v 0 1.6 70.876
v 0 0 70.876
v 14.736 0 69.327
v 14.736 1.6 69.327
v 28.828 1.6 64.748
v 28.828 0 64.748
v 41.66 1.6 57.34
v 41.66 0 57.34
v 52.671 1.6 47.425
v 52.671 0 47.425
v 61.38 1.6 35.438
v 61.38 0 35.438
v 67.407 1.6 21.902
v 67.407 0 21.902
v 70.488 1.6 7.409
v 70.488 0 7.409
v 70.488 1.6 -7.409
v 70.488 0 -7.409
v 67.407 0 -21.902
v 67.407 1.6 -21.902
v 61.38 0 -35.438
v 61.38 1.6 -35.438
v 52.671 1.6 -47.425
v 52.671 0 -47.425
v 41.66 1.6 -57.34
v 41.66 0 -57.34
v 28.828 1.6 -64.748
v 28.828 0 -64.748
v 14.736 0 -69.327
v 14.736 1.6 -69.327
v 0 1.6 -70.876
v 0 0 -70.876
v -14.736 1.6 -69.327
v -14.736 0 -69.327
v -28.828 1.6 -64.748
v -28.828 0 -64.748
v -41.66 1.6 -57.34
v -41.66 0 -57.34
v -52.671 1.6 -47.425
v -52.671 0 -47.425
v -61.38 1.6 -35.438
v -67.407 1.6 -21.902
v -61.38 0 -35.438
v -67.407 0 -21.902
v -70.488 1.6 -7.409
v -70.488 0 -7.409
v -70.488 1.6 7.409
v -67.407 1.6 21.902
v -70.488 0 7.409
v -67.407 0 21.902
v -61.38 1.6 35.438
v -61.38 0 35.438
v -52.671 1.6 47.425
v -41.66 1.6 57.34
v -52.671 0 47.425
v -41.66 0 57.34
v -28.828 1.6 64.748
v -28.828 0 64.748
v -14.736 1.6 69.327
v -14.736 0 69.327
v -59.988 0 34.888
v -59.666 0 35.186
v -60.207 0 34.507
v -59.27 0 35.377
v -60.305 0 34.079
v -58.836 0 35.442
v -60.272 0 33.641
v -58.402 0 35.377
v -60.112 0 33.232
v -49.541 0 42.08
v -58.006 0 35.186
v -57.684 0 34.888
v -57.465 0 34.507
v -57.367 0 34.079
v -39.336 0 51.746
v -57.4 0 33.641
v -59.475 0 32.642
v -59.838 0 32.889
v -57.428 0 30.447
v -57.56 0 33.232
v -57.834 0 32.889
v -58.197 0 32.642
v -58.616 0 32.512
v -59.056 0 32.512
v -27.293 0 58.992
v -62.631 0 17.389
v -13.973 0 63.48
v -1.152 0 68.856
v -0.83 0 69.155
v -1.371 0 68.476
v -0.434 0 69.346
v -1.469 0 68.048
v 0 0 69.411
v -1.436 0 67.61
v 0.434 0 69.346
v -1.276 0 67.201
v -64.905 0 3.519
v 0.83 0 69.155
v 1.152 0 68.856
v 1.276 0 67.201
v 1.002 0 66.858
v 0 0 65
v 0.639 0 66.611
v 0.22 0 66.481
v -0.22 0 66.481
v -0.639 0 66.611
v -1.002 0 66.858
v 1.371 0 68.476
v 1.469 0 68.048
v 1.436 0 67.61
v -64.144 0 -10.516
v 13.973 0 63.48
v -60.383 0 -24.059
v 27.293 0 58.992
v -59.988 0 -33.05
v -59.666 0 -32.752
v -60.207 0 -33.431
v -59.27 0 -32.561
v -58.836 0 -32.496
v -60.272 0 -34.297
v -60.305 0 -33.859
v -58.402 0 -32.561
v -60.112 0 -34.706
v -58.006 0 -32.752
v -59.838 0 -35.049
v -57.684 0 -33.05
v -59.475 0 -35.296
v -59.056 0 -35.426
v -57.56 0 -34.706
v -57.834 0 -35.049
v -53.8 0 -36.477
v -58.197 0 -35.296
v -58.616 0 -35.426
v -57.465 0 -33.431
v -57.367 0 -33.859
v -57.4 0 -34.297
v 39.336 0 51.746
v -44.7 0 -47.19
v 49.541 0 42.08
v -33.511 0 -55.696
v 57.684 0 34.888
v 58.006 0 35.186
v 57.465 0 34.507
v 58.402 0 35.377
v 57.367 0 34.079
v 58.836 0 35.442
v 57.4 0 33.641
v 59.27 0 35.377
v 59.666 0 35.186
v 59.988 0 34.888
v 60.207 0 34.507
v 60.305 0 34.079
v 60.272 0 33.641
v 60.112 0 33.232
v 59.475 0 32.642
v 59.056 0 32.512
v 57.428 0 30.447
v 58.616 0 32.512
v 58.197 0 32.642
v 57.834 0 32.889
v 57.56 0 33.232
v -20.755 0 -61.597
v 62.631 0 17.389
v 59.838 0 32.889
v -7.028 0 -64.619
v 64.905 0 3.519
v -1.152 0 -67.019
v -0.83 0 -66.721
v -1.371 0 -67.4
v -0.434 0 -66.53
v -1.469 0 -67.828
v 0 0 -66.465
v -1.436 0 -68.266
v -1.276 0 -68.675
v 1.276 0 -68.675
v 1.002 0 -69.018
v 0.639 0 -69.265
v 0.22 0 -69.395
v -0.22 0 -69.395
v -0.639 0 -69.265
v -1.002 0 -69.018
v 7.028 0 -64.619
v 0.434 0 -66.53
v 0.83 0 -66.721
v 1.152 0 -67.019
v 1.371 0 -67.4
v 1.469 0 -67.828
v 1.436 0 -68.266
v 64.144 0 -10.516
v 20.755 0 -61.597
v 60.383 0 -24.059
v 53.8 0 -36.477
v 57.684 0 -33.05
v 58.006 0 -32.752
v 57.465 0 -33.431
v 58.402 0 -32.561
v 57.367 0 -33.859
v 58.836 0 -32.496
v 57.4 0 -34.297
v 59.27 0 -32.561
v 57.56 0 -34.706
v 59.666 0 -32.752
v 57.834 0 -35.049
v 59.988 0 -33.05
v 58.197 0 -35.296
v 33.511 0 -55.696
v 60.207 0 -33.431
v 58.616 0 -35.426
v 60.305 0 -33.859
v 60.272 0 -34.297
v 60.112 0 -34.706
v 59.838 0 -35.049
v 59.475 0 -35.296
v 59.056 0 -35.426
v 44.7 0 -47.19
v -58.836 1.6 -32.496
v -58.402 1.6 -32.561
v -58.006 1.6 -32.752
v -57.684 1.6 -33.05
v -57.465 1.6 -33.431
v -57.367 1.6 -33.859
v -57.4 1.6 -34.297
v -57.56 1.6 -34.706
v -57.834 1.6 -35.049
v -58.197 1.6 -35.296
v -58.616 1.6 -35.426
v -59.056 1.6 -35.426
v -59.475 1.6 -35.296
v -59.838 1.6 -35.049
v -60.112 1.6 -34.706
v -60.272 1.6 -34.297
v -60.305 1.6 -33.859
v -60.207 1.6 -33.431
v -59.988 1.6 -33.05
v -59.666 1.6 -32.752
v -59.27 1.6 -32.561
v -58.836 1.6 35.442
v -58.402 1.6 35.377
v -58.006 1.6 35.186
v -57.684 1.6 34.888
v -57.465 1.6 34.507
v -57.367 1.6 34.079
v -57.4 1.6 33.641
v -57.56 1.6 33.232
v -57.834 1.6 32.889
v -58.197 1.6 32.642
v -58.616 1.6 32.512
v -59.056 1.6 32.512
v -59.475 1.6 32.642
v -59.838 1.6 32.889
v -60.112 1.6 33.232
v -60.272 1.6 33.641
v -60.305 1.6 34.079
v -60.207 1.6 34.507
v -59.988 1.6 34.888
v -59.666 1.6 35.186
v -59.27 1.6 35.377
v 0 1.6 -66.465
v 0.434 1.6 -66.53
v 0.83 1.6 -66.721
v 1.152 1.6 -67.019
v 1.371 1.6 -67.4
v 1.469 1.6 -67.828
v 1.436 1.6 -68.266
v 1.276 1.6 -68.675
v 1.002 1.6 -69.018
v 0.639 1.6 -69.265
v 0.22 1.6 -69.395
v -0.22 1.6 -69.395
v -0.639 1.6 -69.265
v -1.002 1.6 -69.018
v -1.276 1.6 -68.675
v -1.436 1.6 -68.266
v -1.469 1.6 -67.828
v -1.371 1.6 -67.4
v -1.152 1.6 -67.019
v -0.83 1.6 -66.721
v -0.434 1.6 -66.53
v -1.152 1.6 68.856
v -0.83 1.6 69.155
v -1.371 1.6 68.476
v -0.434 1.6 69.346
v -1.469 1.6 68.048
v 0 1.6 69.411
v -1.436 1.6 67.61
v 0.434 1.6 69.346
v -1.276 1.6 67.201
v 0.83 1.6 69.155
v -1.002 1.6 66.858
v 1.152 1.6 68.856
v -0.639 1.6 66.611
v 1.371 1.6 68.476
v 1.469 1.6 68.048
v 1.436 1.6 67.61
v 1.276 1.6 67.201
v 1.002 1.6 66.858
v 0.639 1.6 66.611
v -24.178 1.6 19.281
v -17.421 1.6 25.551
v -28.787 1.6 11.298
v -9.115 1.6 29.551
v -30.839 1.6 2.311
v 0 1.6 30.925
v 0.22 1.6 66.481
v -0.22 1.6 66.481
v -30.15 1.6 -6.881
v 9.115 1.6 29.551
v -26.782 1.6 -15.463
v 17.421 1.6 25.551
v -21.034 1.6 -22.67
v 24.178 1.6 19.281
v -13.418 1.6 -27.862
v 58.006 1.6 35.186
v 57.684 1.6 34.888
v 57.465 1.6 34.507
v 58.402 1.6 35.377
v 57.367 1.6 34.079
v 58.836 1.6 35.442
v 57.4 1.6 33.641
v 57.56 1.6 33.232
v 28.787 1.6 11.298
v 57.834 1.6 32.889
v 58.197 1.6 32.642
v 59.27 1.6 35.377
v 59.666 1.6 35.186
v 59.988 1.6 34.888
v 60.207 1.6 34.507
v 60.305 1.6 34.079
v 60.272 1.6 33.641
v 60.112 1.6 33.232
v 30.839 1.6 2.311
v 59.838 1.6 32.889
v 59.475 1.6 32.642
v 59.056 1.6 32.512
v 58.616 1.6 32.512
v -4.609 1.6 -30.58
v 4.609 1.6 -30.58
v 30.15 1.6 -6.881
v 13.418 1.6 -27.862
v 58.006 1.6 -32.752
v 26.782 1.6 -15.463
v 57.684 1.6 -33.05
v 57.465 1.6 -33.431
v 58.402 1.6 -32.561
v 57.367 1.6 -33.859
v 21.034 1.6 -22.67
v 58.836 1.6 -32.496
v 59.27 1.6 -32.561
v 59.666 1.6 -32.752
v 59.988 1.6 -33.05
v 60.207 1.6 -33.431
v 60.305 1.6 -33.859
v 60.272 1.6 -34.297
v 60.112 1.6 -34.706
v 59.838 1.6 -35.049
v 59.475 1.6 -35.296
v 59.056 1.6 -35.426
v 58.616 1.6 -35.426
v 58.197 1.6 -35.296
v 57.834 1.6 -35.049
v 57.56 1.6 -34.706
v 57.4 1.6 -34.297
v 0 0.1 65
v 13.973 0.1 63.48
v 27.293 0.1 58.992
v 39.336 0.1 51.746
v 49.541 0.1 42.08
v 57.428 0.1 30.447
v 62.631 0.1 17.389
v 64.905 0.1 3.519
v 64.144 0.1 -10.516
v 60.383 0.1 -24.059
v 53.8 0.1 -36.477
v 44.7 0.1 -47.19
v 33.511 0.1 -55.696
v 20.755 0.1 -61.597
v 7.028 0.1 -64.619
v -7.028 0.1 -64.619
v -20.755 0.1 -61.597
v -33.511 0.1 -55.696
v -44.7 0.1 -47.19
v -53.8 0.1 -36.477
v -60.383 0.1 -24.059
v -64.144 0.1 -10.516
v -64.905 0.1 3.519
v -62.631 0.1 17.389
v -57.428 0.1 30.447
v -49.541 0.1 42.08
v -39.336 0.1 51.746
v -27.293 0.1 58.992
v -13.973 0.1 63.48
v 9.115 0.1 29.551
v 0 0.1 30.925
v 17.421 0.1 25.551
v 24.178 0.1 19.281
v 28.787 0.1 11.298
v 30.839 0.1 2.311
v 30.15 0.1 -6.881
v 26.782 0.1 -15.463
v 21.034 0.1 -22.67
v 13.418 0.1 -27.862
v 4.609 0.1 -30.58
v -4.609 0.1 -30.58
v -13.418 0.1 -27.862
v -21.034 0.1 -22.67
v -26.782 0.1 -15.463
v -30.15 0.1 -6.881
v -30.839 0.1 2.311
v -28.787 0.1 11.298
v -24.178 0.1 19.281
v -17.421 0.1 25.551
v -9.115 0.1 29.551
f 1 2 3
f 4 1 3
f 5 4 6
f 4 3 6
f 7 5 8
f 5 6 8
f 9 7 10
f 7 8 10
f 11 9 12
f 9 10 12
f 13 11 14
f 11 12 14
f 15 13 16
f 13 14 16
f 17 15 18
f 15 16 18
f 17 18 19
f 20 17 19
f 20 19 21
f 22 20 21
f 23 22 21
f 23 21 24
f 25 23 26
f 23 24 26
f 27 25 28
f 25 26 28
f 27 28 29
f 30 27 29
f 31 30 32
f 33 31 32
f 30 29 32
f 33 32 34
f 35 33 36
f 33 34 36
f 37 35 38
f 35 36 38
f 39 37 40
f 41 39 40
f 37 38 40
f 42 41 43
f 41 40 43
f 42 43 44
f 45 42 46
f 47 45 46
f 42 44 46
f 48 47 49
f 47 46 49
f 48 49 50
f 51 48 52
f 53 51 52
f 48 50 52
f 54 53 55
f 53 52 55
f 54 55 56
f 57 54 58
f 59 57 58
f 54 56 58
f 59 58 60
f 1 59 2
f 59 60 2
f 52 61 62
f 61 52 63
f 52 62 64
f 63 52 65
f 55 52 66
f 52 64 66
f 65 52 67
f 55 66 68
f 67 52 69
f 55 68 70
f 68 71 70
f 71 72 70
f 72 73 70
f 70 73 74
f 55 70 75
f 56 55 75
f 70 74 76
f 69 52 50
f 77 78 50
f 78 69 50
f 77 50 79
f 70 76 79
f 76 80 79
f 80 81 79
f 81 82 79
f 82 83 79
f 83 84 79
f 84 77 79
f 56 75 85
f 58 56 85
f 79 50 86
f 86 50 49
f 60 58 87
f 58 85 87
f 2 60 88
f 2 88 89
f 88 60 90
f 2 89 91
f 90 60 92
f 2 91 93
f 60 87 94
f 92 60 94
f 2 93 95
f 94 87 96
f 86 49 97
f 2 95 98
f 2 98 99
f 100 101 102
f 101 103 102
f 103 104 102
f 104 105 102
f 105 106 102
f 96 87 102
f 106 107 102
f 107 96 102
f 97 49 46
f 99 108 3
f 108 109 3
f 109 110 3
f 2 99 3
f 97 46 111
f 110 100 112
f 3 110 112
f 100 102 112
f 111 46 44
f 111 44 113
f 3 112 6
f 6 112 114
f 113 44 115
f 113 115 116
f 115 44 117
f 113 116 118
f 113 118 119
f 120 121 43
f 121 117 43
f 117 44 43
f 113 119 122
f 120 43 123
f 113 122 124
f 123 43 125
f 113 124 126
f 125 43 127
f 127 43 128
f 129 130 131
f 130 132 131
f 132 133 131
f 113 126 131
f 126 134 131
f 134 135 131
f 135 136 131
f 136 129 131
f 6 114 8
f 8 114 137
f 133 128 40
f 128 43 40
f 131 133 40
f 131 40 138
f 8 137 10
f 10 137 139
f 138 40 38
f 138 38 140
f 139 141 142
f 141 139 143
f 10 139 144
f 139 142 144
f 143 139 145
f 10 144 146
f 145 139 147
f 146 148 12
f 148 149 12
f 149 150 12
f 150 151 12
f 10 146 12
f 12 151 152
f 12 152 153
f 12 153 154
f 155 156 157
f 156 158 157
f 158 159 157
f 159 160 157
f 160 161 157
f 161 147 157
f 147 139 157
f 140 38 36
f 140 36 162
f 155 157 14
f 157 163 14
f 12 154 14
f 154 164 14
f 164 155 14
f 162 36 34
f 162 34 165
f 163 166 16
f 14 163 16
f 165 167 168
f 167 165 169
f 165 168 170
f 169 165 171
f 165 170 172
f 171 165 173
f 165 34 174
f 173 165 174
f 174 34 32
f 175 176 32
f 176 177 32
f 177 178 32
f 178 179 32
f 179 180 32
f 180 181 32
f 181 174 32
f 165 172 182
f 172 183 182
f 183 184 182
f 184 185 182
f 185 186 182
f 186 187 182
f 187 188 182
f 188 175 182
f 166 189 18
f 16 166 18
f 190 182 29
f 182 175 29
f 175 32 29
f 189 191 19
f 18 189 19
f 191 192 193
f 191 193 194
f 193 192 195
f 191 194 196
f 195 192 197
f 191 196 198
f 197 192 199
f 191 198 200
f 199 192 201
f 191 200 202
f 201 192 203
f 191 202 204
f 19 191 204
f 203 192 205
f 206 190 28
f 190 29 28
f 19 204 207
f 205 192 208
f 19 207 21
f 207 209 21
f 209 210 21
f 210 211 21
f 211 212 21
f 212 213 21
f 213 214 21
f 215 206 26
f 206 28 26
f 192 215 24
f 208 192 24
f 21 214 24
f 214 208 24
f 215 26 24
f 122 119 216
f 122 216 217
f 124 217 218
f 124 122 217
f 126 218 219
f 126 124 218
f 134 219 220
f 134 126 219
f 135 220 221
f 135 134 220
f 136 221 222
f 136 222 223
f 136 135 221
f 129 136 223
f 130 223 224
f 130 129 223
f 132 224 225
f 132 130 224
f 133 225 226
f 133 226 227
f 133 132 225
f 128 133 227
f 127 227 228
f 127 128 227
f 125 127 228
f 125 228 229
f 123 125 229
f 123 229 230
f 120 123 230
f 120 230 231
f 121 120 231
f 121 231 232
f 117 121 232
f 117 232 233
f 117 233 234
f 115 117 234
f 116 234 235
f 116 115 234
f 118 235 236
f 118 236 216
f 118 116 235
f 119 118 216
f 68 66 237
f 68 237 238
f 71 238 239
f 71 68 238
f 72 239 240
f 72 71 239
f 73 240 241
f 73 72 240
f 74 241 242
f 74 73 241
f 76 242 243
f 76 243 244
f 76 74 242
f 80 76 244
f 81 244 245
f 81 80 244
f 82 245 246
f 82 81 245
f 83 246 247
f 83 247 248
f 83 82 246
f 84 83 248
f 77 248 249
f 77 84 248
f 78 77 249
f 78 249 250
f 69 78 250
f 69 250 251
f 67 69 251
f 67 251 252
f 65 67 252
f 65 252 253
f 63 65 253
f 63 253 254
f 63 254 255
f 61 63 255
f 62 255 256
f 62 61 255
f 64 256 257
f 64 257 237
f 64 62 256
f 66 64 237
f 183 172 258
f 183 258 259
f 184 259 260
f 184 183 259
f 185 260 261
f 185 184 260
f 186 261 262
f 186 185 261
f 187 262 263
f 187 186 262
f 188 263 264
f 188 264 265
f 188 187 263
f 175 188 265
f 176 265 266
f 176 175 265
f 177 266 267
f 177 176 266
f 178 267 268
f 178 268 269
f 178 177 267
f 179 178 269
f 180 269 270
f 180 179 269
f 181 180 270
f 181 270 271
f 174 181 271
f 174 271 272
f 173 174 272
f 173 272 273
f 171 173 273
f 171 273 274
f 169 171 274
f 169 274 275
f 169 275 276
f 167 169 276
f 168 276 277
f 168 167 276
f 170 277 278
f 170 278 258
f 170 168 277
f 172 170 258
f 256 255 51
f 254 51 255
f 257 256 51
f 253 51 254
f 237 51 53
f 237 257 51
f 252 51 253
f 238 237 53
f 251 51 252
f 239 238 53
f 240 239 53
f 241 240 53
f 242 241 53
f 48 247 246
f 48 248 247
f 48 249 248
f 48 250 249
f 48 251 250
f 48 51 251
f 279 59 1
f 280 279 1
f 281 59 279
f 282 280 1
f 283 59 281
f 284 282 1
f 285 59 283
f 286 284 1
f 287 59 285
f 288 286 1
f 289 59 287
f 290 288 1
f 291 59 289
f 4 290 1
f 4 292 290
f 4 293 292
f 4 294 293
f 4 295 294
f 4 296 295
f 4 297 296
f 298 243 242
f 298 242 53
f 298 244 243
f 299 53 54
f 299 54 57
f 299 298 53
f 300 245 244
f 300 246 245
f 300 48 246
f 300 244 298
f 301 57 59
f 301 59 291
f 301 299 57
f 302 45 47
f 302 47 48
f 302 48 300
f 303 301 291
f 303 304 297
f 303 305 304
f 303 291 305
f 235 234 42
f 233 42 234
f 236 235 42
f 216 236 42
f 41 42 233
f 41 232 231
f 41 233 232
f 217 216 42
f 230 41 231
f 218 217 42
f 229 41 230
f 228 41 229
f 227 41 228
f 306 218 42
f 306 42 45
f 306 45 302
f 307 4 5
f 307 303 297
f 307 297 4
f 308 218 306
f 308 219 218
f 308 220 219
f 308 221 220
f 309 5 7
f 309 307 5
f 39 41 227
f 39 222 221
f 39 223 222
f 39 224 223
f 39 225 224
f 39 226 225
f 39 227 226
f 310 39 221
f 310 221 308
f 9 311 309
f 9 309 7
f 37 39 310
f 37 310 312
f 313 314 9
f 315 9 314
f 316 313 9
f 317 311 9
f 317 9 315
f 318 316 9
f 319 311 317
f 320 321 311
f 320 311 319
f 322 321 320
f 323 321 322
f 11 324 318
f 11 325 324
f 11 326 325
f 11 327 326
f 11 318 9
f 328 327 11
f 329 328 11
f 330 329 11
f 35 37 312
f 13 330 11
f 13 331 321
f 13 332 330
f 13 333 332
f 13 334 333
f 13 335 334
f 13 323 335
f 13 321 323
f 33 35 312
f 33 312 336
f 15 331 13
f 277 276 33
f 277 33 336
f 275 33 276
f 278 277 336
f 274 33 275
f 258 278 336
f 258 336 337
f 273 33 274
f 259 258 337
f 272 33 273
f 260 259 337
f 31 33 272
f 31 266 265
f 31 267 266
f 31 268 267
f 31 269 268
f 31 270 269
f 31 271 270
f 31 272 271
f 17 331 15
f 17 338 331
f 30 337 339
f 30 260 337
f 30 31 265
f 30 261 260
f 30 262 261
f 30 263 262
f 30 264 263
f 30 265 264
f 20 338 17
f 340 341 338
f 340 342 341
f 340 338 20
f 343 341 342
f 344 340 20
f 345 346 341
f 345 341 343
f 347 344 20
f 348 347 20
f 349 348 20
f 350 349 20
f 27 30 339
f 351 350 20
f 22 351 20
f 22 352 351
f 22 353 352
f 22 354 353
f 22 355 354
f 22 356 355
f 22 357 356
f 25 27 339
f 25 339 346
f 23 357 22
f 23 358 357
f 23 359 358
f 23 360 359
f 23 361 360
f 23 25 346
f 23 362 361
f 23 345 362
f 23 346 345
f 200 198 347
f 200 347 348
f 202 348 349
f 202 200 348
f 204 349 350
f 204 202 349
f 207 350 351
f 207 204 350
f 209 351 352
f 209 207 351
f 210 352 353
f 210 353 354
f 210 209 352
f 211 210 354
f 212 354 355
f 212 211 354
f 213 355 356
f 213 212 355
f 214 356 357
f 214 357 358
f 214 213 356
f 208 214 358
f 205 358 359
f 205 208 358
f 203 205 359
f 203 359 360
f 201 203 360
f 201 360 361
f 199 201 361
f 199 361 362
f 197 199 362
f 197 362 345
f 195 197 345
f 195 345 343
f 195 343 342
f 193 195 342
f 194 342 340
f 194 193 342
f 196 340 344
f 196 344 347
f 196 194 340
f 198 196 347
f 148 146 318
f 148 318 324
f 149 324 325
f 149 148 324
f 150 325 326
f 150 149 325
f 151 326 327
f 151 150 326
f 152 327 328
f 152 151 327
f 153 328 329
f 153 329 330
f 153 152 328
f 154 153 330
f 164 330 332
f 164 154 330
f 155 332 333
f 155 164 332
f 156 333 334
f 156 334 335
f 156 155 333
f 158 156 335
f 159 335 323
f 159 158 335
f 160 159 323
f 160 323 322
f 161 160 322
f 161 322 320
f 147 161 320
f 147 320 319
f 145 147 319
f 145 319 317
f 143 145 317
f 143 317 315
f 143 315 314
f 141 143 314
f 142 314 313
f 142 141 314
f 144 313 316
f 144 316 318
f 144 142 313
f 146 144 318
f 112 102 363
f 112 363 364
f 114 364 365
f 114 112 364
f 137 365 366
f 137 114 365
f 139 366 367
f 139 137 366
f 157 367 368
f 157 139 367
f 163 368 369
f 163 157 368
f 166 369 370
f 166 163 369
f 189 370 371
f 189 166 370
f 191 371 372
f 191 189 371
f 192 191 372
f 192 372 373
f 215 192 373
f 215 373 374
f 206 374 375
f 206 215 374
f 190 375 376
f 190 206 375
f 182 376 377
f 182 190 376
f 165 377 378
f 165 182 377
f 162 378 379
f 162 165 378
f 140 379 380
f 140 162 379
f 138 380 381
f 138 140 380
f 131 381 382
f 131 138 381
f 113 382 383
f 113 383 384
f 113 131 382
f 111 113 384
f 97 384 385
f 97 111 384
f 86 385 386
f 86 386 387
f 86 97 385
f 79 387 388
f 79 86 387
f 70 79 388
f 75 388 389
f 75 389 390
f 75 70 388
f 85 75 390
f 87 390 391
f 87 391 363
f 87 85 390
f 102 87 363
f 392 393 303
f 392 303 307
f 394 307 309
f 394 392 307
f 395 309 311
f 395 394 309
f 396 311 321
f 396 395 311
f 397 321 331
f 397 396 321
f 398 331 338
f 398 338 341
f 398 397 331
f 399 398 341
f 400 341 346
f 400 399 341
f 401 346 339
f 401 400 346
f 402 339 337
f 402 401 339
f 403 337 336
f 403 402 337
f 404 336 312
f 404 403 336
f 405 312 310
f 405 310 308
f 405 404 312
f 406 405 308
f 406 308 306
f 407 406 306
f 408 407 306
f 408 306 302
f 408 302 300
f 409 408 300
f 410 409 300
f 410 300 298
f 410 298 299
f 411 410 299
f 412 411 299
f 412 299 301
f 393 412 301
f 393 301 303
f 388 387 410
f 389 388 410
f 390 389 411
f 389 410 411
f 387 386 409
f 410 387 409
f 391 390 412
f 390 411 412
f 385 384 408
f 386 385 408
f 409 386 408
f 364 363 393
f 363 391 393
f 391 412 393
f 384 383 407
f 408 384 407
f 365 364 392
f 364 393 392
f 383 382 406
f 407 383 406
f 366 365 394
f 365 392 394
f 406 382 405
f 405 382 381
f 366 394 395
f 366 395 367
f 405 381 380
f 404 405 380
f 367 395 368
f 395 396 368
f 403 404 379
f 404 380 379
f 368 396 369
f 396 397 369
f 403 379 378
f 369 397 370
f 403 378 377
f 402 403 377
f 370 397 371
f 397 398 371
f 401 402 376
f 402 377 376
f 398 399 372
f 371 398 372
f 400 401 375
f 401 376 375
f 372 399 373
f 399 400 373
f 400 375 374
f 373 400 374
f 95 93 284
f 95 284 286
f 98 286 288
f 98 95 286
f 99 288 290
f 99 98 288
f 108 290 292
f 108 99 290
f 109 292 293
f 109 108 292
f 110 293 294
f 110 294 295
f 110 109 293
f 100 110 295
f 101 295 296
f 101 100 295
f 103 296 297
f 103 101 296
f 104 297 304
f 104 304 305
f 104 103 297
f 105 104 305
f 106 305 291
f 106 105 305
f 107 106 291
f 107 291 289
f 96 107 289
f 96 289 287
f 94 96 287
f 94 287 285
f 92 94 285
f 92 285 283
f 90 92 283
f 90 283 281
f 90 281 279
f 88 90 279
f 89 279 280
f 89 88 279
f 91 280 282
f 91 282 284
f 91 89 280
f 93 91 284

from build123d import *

# Parameters (mm, degrees)
SKETCH1_R           = 70.8759
SKETCH1_R_2         = 1.4732
SKETCH1_R_3         = 30.925
BOSS_EXTRUDE1_DEPTH = 1.6
SKETCH1_3_R         = 65
SKETCH1_3_R_2       = 30.925
CUT_EXTRUDE1_DEPTH  = 0.1


with BuildPart() as part:
    # Sketch1 → Boss-Extrude1 (new body)
    with BuildSketch(Plane(origin=(0, 0, 0), x_dir=(1, 0, 0), z_dir=(0, 1, 0))):
        Circle(SKETCH1_R)
        with Locations((-58.835990581, -33.968975)):
            Circle(SKETCH1_R_2, mode=Mode.SUBTRACT)
        with Locations((0, -67.93795)):
            Circle(SKETCH1_R_2, mode=Mode.SUBTRACT)
        with Locations((58.835990581, -33.968975)):
            Circle(SKETCH1_R_2, mode=Mode.SUBTRACT)
        with Locations((-58.835990581, 33.968975)):
            Circle(SKETCH1_R_2, mode=Mode.SUBTRACT)
        with Locations((0, 67.93795)):
            Circle(SKETCH1_R_2, mode=Mode.SUBTRACT)
        with Locations((58.835990581, 33.968975)):
            Circle(SKETCH1_R_2, mode=Mode.SUBTRACT)
        Circle(SKETCH1_R_3, mode=Mode.SUBTRACT)
    extrude(amount=BOSS_EXTRUDE1_DEPTH)

    # Sketch1<3> → Cut-Extrude1 (cut)
    with BuildSketch(Plane(origin=(0, 0, 0), x_dir=(1, 0, 0), z_dir=(0, 1, 0))):
        Circle(SKETCH1_3_R)
        Circle(SKETCH1_3_R_2, mode=Mode.SUBTRACT)
    extrude(amount=CUT_EXTRUDE1_DEPTH, mode=Mode.SUBTRACT)


solid = part.part
